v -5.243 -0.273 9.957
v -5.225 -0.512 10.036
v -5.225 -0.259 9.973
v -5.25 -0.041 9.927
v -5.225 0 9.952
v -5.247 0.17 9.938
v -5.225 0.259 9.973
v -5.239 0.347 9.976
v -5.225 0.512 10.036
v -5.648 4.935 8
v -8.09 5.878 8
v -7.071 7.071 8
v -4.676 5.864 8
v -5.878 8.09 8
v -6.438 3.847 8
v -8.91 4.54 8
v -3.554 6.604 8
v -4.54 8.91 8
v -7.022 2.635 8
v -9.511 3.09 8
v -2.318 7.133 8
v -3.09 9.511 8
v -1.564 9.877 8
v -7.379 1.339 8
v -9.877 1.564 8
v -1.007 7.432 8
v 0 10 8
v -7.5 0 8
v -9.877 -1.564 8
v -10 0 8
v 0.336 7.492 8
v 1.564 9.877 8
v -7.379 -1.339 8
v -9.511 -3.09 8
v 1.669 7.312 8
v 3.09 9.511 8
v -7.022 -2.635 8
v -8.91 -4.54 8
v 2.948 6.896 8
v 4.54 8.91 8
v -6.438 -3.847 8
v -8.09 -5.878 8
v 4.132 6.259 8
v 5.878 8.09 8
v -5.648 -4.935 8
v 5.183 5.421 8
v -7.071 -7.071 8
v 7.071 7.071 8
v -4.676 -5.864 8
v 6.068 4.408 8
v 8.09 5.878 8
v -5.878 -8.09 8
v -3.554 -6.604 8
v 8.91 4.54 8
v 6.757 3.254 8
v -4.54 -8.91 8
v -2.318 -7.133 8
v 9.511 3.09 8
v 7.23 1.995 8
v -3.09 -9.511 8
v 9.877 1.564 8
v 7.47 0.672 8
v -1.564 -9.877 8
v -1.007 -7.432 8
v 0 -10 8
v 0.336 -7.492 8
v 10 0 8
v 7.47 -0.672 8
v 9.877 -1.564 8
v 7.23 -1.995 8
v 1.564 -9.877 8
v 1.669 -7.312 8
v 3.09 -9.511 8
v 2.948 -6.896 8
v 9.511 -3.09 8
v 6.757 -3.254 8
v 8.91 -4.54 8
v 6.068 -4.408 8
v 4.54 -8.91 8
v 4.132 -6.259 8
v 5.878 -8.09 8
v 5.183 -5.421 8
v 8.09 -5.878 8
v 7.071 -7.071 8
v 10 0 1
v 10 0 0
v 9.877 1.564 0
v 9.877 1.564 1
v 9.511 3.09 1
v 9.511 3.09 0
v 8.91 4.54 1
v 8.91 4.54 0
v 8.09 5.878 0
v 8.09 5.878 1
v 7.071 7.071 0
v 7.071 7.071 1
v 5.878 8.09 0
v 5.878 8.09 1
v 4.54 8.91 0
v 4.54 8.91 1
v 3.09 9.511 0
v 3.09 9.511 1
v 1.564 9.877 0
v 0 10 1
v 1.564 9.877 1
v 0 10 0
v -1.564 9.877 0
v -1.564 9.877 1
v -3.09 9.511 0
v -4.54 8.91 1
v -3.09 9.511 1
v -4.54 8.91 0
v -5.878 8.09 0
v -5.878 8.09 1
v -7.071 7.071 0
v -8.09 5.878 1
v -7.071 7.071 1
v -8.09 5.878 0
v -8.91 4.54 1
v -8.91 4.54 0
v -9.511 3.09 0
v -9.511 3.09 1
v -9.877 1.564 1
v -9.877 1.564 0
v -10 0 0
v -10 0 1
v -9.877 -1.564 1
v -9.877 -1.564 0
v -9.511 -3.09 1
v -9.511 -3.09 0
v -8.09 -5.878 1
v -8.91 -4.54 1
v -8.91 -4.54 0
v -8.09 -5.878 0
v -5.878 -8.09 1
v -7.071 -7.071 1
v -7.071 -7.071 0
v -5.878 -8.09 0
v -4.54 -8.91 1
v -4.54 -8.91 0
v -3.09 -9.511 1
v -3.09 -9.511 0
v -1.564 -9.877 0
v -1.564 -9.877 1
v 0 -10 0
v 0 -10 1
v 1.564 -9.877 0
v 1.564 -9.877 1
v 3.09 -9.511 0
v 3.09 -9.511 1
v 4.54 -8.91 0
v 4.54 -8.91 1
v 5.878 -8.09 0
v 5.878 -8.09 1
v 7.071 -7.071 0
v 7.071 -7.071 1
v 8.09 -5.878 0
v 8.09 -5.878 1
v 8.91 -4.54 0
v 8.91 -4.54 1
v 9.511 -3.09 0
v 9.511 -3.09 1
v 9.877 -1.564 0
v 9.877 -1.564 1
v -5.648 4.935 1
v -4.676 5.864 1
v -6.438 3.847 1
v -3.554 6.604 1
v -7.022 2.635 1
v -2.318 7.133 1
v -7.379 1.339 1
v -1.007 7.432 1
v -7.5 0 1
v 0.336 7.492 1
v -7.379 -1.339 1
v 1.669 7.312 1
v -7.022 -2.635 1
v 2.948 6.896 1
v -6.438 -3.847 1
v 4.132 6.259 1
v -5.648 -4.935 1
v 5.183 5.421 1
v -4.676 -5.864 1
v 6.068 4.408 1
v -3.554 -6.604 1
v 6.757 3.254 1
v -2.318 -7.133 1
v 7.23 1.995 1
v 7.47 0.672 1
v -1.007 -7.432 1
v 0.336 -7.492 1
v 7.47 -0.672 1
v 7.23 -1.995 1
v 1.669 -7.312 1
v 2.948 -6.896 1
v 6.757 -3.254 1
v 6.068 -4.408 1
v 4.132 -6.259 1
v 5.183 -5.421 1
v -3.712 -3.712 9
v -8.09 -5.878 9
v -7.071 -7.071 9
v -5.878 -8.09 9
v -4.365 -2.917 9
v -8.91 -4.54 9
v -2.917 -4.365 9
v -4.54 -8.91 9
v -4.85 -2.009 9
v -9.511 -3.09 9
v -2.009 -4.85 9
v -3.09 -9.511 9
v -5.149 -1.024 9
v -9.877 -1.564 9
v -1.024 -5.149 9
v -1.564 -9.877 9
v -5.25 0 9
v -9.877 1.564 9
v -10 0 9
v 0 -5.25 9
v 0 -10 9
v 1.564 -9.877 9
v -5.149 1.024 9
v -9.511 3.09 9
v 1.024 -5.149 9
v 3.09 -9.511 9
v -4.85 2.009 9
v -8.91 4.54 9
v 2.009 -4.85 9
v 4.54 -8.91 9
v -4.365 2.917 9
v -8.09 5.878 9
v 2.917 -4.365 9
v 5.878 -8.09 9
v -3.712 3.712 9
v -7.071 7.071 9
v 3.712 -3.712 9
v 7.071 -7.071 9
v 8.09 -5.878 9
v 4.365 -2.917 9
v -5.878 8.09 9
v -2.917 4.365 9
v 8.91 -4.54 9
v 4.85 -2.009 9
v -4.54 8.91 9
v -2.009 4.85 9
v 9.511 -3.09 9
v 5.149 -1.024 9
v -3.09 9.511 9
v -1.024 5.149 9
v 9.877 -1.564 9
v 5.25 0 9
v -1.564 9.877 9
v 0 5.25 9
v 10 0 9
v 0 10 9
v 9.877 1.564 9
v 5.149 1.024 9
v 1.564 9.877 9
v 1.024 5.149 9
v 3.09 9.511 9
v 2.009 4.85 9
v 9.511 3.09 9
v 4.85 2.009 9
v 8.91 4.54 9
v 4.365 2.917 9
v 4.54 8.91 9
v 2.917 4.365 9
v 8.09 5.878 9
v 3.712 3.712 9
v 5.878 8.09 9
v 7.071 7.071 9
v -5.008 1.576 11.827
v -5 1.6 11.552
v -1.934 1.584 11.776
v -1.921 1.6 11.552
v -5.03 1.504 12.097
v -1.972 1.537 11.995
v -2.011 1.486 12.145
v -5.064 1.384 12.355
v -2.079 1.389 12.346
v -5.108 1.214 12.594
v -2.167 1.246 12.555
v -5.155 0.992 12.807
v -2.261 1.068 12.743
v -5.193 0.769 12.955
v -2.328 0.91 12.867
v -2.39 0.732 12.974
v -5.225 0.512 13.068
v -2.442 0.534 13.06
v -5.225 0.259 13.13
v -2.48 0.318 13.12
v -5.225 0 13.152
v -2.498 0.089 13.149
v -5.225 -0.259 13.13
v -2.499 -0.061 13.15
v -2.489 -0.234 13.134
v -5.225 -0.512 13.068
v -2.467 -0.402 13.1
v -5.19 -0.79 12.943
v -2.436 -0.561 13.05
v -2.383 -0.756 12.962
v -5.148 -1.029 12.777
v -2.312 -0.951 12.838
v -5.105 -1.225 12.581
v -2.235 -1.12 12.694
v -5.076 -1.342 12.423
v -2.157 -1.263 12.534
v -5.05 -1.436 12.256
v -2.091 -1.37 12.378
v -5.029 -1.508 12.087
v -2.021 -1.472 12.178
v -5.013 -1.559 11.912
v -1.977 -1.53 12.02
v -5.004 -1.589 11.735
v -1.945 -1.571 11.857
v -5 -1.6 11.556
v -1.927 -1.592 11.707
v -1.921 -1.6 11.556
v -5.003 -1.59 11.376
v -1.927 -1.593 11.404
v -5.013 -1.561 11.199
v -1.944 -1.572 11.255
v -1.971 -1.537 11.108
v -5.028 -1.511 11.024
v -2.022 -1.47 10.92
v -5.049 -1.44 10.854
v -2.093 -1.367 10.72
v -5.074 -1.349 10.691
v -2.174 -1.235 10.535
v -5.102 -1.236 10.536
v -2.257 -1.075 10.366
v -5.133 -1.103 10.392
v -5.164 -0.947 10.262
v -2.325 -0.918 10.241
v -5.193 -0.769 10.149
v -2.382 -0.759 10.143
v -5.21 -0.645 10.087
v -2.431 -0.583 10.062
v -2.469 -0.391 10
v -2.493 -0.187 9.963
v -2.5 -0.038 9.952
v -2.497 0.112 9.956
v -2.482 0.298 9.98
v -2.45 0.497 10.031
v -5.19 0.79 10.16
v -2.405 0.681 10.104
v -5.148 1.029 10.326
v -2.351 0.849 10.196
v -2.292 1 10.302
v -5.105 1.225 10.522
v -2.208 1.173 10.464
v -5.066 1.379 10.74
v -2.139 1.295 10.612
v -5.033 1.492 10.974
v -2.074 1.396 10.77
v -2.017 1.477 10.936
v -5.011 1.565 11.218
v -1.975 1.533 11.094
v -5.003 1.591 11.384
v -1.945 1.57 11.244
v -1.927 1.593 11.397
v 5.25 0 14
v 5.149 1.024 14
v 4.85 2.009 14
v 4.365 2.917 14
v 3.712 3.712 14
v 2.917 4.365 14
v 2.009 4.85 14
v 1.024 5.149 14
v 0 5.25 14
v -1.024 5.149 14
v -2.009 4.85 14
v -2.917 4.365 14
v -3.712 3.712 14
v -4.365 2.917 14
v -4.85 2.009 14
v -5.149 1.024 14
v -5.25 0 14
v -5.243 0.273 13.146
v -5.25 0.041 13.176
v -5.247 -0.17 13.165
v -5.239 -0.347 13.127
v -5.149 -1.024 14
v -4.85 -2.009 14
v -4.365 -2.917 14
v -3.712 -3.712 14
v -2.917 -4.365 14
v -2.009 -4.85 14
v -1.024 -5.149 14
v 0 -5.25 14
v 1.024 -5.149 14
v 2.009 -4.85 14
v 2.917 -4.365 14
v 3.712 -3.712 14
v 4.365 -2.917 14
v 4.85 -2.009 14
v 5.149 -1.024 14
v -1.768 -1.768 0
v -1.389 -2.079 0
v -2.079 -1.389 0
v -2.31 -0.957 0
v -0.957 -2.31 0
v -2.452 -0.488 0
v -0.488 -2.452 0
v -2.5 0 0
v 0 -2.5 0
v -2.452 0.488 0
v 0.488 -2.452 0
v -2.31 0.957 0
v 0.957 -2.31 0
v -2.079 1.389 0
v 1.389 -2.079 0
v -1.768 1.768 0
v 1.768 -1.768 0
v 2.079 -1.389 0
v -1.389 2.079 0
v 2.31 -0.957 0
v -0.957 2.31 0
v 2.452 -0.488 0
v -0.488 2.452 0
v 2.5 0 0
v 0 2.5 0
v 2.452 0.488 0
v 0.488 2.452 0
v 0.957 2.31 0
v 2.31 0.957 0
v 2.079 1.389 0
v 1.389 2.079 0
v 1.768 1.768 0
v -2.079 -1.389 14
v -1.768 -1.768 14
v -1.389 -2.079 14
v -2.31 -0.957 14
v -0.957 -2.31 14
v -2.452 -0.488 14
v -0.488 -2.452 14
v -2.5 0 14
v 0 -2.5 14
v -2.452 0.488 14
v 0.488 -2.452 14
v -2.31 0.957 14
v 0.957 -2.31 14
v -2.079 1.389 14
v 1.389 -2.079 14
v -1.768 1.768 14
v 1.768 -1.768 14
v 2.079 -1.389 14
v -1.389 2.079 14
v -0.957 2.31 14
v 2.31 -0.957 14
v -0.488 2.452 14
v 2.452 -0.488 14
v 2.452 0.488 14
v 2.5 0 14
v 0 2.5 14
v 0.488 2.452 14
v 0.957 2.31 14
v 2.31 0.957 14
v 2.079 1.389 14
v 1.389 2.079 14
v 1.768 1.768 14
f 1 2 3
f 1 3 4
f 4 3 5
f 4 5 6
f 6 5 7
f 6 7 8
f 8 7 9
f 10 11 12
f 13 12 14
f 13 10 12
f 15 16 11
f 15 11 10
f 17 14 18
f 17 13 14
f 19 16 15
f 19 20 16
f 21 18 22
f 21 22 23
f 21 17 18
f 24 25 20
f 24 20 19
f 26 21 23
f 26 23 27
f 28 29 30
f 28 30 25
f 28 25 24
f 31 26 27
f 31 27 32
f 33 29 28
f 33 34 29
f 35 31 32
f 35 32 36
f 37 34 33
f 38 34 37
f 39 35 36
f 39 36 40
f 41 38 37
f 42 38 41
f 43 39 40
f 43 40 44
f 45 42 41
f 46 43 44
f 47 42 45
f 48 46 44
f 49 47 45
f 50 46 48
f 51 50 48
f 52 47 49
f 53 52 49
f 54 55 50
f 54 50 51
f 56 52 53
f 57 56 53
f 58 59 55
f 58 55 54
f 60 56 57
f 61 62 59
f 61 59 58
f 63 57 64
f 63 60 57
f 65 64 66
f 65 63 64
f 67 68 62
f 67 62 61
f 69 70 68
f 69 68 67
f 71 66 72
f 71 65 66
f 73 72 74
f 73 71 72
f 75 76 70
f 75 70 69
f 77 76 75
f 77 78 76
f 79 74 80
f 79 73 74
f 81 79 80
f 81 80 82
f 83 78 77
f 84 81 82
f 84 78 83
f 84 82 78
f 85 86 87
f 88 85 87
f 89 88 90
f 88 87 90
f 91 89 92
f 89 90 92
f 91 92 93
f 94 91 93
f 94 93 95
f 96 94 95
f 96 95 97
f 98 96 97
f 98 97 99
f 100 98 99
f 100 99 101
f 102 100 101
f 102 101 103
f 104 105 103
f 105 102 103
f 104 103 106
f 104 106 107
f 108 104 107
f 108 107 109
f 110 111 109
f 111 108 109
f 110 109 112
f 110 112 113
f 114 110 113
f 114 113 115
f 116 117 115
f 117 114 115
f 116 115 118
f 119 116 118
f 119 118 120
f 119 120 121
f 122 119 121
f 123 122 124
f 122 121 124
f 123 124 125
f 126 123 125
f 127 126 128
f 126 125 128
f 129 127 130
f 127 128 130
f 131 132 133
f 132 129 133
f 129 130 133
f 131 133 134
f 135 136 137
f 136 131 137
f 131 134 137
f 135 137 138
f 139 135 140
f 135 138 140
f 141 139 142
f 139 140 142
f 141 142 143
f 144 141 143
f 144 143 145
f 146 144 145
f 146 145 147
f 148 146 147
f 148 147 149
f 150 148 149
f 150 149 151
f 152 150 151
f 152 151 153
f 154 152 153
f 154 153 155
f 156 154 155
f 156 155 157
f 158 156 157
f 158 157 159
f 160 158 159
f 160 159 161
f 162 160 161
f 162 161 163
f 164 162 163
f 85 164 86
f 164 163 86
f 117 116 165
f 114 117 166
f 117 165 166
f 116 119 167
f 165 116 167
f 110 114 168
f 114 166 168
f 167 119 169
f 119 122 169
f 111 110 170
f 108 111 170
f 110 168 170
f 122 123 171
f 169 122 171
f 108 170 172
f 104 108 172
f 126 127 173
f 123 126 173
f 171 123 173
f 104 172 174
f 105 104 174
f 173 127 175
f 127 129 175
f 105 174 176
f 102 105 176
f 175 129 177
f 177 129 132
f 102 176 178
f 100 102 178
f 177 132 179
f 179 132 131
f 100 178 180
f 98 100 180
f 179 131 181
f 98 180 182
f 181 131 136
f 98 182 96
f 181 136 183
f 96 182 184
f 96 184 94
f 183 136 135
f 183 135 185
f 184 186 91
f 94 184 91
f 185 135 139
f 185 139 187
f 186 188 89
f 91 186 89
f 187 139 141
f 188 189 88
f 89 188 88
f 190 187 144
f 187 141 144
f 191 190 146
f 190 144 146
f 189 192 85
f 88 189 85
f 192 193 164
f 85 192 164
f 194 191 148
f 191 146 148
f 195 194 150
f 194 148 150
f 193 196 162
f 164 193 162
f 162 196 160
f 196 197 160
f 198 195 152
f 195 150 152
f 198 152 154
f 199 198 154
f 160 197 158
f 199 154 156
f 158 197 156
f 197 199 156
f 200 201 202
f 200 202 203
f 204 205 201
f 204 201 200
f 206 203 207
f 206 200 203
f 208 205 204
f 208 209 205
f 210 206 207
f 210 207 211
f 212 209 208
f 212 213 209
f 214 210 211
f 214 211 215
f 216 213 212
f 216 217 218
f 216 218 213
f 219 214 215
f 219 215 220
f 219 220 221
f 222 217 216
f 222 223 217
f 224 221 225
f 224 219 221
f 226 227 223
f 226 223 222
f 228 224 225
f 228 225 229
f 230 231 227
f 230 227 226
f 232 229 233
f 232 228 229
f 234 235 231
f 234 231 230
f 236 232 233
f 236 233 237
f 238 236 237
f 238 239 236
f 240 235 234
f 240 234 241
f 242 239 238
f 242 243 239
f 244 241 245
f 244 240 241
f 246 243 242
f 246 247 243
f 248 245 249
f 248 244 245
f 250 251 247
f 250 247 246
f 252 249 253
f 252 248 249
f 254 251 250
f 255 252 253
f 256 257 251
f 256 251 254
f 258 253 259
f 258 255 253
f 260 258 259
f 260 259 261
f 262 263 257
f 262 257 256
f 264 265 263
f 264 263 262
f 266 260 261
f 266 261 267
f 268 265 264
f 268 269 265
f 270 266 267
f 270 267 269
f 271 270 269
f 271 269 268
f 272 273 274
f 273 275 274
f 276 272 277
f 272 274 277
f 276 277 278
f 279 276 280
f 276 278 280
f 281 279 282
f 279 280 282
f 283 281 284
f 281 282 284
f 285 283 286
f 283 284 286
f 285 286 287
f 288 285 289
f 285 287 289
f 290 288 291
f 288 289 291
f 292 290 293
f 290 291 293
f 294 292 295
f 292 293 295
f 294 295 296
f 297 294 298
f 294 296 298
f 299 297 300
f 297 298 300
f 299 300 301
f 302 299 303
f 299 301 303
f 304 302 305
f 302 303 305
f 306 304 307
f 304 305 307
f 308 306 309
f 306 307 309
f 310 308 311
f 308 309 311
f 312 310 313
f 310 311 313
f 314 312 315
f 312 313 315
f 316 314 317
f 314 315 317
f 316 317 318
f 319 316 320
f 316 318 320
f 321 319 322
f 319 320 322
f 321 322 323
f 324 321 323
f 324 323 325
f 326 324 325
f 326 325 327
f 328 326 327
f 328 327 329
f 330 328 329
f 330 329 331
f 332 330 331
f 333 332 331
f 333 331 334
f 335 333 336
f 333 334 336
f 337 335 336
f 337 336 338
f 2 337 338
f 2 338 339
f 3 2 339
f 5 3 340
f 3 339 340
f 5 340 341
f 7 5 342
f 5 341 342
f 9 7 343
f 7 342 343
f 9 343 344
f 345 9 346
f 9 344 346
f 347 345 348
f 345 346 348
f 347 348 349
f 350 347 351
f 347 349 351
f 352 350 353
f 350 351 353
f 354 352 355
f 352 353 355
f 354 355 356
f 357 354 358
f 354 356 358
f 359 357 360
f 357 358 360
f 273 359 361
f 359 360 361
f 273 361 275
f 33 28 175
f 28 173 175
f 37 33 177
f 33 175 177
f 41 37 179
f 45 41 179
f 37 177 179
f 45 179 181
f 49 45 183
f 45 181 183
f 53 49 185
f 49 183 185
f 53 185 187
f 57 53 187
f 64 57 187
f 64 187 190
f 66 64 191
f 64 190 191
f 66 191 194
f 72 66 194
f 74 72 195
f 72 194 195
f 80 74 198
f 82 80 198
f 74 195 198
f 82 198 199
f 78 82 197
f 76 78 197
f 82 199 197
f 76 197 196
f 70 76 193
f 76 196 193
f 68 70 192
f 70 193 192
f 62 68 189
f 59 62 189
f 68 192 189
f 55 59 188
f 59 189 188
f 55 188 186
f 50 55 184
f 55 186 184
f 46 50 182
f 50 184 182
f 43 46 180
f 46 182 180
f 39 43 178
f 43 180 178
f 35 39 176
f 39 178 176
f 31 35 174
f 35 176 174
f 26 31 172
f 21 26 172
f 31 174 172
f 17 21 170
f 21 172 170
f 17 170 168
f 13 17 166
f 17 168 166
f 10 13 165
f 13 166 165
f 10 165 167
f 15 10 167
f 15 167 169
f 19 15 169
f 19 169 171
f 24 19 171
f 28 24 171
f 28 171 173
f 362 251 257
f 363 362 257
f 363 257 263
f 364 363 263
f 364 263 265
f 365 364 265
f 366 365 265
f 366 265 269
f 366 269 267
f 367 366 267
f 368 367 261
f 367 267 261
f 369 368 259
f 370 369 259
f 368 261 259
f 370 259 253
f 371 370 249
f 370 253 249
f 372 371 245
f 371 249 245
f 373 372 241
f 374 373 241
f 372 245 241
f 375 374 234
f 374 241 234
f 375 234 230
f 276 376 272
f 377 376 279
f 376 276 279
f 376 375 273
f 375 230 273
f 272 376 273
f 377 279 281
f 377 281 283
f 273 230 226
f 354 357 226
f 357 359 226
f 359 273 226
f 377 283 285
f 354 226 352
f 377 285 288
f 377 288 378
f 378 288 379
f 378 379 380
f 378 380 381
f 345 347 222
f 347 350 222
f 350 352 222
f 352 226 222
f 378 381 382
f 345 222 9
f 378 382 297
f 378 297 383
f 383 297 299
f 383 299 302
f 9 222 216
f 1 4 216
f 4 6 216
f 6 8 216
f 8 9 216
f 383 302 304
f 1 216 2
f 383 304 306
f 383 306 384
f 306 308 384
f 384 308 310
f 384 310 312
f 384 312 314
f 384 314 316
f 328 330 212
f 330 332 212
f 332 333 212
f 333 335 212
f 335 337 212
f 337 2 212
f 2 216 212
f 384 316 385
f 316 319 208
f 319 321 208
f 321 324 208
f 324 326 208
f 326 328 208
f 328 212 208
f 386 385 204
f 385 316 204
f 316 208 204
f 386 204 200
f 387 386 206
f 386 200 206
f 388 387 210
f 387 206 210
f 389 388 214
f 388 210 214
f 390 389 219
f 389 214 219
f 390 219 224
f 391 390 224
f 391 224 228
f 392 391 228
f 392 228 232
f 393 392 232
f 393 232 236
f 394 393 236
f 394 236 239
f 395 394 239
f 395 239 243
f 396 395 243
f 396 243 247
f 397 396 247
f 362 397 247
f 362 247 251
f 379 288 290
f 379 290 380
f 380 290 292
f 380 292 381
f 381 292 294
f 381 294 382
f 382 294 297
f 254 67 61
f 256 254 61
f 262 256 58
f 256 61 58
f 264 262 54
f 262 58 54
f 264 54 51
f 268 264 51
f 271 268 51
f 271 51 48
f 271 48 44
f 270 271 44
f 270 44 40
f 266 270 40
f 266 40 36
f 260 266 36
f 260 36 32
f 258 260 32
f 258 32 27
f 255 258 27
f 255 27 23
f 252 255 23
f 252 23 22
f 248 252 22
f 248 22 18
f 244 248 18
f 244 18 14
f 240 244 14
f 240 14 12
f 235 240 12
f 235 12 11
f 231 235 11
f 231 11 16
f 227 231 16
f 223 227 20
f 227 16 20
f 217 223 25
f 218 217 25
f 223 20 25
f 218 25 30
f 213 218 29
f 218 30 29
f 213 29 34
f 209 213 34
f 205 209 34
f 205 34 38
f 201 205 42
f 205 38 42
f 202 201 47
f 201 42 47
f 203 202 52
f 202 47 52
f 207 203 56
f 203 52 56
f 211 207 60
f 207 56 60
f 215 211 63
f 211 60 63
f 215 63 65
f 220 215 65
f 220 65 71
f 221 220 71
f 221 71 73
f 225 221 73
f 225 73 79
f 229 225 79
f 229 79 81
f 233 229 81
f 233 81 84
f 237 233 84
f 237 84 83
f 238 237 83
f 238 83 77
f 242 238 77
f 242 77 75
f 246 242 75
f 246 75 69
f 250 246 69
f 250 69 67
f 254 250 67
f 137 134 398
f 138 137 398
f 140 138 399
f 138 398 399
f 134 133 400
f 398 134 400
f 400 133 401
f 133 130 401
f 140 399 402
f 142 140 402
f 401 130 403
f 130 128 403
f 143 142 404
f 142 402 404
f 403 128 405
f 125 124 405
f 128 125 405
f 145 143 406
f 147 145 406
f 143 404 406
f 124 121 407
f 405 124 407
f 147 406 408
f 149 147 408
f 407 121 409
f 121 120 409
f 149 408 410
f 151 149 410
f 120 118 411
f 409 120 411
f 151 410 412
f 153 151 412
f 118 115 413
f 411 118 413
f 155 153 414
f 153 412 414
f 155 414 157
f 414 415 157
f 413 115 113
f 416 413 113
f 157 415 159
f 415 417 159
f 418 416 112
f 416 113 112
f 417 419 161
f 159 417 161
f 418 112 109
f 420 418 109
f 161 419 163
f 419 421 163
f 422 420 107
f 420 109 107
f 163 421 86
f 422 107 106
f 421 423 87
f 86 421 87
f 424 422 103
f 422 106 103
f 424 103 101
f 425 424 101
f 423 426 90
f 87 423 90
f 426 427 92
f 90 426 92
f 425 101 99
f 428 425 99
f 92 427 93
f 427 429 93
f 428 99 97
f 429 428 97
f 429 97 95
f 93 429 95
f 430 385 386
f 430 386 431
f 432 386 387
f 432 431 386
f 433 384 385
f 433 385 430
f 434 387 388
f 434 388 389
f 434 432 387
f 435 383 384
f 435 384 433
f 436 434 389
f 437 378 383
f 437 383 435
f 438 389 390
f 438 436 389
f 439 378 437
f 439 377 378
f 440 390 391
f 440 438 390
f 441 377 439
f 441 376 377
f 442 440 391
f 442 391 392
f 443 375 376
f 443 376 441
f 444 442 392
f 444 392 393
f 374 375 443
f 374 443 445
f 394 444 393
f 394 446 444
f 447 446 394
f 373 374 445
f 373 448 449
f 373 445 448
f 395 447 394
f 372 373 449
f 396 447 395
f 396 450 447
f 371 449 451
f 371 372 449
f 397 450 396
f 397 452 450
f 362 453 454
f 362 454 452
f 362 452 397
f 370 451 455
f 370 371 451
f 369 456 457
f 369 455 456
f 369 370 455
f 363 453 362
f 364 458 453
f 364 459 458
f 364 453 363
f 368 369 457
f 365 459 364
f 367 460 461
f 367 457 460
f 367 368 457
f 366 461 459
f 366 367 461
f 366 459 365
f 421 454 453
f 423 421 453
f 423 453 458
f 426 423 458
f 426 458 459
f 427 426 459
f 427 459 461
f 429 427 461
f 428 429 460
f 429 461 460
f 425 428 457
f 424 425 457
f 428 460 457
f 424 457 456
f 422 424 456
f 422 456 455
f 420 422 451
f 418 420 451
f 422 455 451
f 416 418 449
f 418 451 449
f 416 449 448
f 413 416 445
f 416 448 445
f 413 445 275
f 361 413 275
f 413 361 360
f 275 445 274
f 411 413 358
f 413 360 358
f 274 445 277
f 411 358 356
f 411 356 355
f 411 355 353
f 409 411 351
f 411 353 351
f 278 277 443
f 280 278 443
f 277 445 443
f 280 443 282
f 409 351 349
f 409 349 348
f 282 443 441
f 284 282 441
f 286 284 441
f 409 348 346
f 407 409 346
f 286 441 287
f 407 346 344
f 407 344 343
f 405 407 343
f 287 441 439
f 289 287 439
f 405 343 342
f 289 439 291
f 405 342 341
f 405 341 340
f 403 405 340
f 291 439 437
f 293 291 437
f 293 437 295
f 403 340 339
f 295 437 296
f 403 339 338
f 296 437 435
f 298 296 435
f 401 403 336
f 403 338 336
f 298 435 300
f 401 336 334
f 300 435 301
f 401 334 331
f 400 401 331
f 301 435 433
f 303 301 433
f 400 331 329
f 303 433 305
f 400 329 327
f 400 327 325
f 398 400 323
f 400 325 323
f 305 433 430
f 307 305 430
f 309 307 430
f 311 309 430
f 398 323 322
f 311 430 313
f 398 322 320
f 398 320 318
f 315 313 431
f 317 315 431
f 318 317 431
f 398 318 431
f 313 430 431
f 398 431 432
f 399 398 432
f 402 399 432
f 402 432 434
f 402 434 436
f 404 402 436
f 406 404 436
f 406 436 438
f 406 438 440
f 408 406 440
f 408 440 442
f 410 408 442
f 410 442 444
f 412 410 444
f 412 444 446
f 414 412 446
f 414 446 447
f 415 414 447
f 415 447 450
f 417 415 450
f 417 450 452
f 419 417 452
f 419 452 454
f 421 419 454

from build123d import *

# Parameters (mm, degrees)
ESQUISSE1_R             = 10
BOSS_EXTRU_1_DEPTH      = 9
ESQUISSE2_R             = 5.25
BOSS_EXTRU_2_DEPTH      = 5
ESQUISSE3_R             = 2.5
ENL_V_MAT_EXTRU_1_DEPTH = 20.899748742
ESQUISSE4_W             = 7
ESQUISSE4_H             = 2.5


# Read off the part's stored shape, not the designer's step: Dégagement M31
with BuildPart() as part:
    # Esquisse1 → Boss.-Extru.1 (new body)
    with BuildSketch(Plane.XY):
        Circle(ESQUISSE1_R)
    extrude(amount=BOSS_EXTRU_1_DEPTH)

    # Esquisse2 → Boss.-Extru.2 (add)
    with BuildSketch(Plane.XY.offset(9)):
        Circle(ESQUISSE2_R)
    extrude(amount=BOSS_EXTRU_2_DEPTH)

    # Esquisse3 → Enlèv. mat.-Extru.1 (cut, through all)
    with BuildSketch(Plane.XY.offset(14)):
        Circle(ESQUISSE3_R)
    extrude(amount=-ENL_V_MAT_EXTRU_1_DEPTH, mode=Mode.SUBTRACT)

    # Esquisse4 → Enlèvement de matière-Révolution1 (revolve, cut)
    with BuildSketch(Plane(origin=(0, 0, 0), x_dir=(0, 0, -1), z_dir=(1, 0, 0)), mode=Mode.PRIVATE) as enl_vement_de_mati_re_r_volution1_sk:
        with Locations((-4.5, 8.75)):
            Rectangle(ESQUISSE4_W, ESQUISSE4_H)
    revolve(enl_vement_de_mati_re_r_volution1_sk.sketch.rotate(Axis((0, 0, 0), (0, 0, 1)), 90), axis=Axis((0, 0, 0), (0, 0, 1)), mode=Mode.SUBTRACT)

    # Dégagement M31 outline → Dégagement M31 (revolve, cut)
    with BuildSketch(Plane.YX.offset(-11.551623765)):
        Polygon((1.6, -5.250016412), (1.6, -5.225), (1.6, -1.920645137), (0, -1.920645137), (0, -5.250016412), align=None)
        Polygon((1.625016412, -5.250016412), (1.599998144, -5.224998144), (1.6, -5.250016412), align=None)
    revolve(axis=Axis((0, 0, 11.551623765), (1, 0, 0)), mode=Mode.SUBTRACT)


solid = part.part
